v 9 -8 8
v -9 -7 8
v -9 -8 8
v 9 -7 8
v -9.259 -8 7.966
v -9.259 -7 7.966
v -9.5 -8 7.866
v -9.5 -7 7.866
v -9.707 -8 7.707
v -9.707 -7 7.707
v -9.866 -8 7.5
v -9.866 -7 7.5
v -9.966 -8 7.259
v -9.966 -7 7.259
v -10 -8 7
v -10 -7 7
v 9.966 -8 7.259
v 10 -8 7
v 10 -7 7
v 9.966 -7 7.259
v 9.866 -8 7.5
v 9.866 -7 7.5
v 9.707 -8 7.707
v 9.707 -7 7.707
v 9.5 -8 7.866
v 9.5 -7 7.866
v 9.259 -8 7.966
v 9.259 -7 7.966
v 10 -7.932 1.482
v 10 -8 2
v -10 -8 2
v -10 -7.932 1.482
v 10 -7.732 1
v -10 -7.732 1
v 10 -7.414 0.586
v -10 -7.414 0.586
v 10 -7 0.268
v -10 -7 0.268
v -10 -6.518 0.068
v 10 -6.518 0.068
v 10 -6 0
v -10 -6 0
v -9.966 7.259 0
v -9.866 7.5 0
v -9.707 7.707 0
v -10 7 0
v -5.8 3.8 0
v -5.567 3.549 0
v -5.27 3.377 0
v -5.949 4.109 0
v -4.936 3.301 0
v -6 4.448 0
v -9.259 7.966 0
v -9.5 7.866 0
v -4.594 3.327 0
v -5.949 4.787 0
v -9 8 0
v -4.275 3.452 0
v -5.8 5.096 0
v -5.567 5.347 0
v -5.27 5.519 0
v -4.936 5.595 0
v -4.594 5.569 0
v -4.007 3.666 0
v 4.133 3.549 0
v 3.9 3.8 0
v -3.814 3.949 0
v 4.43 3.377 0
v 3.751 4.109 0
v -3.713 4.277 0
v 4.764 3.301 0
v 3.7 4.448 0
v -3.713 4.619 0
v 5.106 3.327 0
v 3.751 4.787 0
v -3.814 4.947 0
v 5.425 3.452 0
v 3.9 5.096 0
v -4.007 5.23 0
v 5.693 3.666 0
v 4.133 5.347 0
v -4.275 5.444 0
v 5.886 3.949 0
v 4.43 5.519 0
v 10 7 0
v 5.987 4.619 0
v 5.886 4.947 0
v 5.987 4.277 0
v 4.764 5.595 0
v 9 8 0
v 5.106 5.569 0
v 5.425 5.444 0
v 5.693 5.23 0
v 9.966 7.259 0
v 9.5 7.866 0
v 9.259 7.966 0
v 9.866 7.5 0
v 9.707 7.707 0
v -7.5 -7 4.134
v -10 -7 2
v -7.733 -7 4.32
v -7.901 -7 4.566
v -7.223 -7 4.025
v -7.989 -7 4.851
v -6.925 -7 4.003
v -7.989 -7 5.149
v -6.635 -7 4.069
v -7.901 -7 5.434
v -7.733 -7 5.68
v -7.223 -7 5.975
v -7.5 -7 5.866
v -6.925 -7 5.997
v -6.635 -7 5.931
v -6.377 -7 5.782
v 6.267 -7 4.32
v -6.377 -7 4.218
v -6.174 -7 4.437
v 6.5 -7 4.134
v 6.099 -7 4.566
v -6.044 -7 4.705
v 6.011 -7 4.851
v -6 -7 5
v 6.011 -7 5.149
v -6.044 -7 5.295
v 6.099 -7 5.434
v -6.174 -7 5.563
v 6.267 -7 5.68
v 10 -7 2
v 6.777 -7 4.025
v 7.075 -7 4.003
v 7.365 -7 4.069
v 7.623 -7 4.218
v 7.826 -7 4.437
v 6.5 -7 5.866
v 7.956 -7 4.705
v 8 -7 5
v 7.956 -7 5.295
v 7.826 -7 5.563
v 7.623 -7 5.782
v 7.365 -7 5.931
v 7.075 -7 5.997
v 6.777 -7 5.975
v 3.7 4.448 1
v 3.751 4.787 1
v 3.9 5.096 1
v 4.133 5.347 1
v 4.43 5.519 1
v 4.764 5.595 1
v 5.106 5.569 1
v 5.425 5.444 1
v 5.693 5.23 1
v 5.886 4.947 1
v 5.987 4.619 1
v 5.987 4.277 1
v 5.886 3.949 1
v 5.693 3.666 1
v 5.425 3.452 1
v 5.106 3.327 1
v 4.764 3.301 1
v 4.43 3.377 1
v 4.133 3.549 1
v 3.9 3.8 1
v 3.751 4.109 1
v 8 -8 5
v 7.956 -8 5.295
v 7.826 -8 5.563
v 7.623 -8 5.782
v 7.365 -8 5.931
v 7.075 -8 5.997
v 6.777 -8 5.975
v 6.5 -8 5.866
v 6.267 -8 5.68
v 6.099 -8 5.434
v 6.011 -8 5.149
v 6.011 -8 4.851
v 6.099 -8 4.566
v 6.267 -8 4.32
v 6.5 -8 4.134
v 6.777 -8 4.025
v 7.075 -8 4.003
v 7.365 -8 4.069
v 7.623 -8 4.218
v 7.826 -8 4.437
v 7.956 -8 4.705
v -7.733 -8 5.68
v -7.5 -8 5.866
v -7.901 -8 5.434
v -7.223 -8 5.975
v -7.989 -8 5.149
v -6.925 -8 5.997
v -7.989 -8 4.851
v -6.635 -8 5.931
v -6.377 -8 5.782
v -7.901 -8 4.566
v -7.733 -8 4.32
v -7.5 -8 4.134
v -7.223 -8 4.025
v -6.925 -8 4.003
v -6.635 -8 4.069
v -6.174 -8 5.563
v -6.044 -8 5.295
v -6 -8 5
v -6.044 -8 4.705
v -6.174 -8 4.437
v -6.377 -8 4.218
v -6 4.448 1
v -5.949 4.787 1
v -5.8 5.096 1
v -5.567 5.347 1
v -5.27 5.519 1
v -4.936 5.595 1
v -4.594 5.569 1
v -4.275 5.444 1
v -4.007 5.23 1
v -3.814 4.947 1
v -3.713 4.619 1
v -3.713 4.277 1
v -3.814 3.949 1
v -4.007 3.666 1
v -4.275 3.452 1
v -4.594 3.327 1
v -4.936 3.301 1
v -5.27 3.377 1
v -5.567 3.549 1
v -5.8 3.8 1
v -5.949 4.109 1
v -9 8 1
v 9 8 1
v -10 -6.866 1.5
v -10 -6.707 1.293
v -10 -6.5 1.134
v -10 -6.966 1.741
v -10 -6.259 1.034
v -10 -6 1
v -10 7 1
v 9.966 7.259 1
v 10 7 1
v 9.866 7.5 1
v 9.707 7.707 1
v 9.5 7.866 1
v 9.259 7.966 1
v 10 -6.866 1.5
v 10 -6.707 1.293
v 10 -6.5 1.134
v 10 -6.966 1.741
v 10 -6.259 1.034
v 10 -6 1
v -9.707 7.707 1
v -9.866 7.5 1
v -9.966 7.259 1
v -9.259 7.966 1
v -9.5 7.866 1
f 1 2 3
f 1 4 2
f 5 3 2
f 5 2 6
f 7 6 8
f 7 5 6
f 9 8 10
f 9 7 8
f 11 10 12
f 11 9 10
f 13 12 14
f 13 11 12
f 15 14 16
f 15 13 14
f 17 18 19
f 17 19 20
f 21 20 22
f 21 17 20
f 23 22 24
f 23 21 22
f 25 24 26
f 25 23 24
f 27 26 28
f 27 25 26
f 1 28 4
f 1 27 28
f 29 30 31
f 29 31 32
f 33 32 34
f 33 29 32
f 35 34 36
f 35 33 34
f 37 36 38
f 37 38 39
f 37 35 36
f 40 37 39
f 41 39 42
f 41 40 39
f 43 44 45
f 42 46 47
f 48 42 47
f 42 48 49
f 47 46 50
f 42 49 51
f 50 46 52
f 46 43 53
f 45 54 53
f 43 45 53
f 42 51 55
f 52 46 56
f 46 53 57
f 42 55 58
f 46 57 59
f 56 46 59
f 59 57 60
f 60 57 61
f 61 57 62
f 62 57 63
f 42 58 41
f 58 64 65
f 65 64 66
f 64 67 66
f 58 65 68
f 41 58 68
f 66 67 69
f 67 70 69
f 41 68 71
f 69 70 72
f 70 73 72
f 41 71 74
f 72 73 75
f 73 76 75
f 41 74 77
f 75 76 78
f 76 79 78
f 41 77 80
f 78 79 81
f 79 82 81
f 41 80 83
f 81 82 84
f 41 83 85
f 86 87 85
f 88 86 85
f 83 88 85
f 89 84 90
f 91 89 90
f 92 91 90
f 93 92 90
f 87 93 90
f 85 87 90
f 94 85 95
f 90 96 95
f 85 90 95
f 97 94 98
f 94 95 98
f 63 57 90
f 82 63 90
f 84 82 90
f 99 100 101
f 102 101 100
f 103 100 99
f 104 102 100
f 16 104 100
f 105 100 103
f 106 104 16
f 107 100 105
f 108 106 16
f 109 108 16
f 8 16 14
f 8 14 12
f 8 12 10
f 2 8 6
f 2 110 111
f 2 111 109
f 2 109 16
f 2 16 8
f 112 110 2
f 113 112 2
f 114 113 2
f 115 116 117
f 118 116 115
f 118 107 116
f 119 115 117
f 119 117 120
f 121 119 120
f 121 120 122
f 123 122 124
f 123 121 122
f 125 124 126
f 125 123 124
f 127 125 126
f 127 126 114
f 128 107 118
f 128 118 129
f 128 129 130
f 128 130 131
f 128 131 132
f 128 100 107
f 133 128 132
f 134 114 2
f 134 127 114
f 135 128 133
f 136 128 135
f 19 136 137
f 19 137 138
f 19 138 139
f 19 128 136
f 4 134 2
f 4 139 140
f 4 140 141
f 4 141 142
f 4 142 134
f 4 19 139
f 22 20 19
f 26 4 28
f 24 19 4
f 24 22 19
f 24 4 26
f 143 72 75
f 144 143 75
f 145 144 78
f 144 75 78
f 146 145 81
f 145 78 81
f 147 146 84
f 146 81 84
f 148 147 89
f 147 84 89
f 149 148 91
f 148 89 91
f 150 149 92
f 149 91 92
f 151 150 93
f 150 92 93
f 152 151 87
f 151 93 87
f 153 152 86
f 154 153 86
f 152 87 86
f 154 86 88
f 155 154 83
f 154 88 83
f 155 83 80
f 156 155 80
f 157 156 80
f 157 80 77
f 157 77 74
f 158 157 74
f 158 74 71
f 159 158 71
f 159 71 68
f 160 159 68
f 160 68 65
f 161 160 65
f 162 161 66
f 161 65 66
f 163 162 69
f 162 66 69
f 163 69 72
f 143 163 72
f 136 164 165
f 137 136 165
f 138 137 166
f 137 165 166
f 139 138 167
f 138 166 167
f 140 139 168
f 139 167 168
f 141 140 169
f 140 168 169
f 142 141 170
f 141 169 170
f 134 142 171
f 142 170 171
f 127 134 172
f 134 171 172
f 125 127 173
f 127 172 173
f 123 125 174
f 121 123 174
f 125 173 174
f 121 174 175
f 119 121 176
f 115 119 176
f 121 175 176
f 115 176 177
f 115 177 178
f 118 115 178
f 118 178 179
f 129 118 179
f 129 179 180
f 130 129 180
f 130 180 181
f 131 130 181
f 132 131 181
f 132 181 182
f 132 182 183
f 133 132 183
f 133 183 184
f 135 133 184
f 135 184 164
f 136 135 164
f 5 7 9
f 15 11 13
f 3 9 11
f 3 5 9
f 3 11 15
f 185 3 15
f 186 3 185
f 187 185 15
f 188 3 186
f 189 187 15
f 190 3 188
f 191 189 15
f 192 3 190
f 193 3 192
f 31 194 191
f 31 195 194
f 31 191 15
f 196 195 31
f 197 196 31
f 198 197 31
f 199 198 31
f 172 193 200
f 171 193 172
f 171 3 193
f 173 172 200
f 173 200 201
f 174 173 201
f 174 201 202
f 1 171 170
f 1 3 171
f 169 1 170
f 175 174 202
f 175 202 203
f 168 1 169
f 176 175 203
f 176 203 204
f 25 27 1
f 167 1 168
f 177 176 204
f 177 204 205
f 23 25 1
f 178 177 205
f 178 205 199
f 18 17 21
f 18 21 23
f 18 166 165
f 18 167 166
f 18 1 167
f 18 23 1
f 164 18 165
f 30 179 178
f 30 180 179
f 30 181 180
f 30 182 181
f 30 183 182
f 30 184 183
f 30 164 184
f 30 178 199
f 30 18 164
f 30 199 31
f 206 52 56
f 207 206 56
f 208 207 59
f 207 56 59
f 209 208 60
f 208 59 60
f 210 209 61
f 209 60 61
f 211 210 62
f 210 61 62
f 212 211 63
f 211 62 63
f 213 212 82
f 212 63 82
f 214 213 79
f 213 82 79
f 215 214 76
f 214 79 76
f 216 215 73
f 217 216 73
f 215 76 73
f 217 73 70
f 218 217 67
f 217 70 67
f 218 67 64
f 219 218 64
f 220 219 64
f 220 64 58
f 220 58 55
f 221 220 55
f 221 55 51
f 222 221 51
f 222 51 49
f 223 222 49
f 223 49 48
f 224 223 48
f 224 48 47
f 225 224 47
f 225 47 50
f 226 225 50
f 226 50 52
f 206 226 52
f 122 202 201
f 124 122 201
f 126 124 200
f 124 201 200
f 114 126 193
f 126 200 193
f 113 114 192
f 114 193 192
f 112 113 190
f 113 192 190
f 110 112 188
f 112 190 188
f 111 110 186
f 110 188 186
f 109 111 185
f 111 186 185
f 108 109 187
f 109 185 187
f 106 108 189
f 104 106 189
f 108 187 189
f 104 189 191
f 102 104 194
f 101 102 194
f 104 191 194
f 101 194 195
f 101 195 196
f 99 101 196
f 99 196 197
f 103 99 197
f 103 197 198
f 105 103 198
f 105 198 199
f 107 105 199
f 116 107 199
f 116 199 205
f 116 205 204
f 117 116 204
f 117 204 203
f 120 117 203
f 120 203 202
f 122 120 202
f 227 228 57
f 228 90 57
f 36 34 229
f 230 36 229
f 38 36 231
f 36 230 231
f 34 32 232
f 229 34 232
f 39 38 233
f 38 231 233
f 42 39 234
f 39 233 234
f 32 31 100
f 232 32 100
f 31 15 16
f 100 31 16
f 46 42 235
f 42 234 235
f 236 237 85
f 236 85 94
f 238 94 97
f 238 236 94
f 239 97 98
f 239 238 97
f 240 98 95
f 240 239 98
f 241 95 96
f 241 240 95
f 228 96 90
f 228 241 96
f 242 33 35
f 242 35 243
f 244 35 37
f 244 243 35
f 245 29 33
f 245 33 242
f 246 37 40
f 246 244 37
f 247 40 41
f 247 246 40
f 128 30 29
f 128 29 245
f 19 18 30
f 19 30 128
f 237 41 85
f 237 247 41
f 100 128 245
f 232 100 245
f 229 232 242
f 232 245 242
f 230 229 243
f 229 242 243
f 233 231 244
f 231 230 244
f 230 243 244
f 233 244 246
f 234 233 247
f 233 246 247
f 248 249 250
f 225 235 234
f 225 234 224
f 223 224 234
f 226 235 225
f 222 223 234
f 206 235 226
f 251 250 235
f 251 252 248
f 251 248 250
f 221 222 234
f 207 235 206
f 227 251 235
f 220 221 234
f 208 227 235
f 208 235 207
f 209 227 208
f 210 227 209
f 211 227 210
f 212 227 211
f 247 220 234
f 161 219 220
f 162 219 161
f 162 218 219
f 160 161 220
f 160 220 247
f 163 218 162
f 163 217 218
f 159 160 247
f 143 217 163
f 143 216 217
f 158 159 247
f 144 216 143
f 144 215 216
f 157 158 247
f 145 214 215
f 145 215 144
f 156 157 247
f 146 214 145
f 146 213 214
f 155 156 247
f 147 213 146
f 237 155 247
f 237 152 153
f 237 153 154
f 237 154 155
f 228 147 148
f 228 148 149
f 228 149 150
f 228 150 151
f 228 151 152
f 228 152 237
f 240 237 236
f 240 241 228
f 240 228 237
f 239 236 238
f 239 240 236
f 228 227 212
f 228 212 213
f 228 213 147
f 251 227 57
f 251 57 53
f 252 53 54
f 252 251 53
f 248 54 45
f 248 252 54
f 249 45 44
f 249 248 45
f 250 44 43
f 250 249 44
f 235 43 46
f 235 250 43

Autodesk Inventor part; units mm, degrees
ref_plane "YZ Plane" through (0, 0, 0) normal (1, 0, 0) x (0, 1, 0)
ref_plane "XZ Plane" through (0, 0, 0) normal (0, 1, 0) x (-1, 0, 0)
ref_plane "XY Plane" through (0, 0, 0) normal (0, 0, 1) x (1, 0, 0)
sketch "Base" plane through (0, 0, 0) normal (0, 0, 1) x (1, 0, 0)
  line L0 (-10, -8) -> (10, -8)
  line L1 (10, -8) -> (10, 8)
  line L2 (10, 8) -> (-10, 8)
  line L3 (-10, 8) -> (-10, -8)
  line L4 (-10, -8) -> (10, 8) construction
  line L5 (10, -8) -> (-10, 8) construction
  point P0 (0, 0)
  dimension "d0" = 20
  dimension "d1" = 16
extrude "Plate1" add sketch "Base" along normal blind 1
sketch "Sketch2" plane through (10, -7, 0) normal (0, -1, 0) x (1, 0, 0)
  line L0 (-20, 0) -> (0, 0)
  line L1 (0, 0) -> (0, 8)
  line L2 (0, 8) -> (-20, 8)
  line L3 (-20, 8) -> (-20, 0)
edge flange "MountFeature" height 8 angle 90 thickness 1 bend radius 1 thickness toward (0, -1, 0) relief tear relief width 1 relief depth 0.5 edges at (0, -8, 1) wall of the first edge with corners at (-10, -7, 0) (10, -7, 0) (10, -7, 8) (-10, -7, 8)
bend "Bend1"
corner "Corner1"
sketch "MountHoles" plane through (0, 0, 0) normal (0, 0, -1) x (-1, 0, 0)
  circle A0 centre (4.85, 4.448) radius 1.15 projected
  circle A1 centre (-4.85, 4.448) radius 1.15 projected
  point P0 (0, 0)
extrude "MountHolesFeature" cut sketch "MountHoles" against normal blind 1
fillet "EdgeFilletsFeature" radius 1 4 edges at (10, 8, 0.5) (-10, 8, 0.5) (-10, -7.5, 8) (10, -7.5, 8)
sketch "ArmMountHoles" plane through (-10, -8, 2) normal (0, -1, 0) x (1, 0, 0)
  line L0 (0, 3) -> (20, 3) construction
  line L1 (10, -3.8) -> (10, 8.8) construction
  circle A0 centre (3, 3) radius 1
  circle A1 centre (17, 3) radius 1
  line L2 (1, 6) -> (19, 6) projected
  line L3 (20, 0) -> (20, 5) projected
  line L4 (0, 0) -> (0, 5) projected
  point P0 (10, -2)
  dimension "d17" = 2
  dimension "d20" = 3
extrude "ArmMountHolesFeature" cut sketch "ArmMountHoles" against normal blind 1
equation "\"d13\" = Thickness"
equation "\"d18\" = Thickness"
equation "\"d2\" = Thickness"
equation "\"d3\" = BendReliefWidth"
equation "\"d4\" = BendReliefDepth"
equation "\"d5\" = MinimumRemnant"
equation "\"d6\" = TransitionRadius"
equation "\"d9\" = BendRadius"
equation "\"d10\" = CornerReliefSize"
equation "\"d11\" = GapSize"
equation "\"d12\" = JacobiRadiusSize"
equation "\"BendRadius\" = Thickness"
equation "\"BendReliefWidth\" = Thickness"
equation "\"BendReliefDepth\" = 0.5 * Thickness"
equation "\"CornerReliefSize\" = 4 * Thickness"
equation "\"MinimumRemnant\" = 2 * Thickness"
equation "\"TransitionRadius\" = BendRadius"
equation "\"JacobiRadiusSize\" = BendRadius"
equation "\"GapSize\" = Thickness"
equation "\"Thickness\" = 1"
properties part number "LimitSwitchMount"
